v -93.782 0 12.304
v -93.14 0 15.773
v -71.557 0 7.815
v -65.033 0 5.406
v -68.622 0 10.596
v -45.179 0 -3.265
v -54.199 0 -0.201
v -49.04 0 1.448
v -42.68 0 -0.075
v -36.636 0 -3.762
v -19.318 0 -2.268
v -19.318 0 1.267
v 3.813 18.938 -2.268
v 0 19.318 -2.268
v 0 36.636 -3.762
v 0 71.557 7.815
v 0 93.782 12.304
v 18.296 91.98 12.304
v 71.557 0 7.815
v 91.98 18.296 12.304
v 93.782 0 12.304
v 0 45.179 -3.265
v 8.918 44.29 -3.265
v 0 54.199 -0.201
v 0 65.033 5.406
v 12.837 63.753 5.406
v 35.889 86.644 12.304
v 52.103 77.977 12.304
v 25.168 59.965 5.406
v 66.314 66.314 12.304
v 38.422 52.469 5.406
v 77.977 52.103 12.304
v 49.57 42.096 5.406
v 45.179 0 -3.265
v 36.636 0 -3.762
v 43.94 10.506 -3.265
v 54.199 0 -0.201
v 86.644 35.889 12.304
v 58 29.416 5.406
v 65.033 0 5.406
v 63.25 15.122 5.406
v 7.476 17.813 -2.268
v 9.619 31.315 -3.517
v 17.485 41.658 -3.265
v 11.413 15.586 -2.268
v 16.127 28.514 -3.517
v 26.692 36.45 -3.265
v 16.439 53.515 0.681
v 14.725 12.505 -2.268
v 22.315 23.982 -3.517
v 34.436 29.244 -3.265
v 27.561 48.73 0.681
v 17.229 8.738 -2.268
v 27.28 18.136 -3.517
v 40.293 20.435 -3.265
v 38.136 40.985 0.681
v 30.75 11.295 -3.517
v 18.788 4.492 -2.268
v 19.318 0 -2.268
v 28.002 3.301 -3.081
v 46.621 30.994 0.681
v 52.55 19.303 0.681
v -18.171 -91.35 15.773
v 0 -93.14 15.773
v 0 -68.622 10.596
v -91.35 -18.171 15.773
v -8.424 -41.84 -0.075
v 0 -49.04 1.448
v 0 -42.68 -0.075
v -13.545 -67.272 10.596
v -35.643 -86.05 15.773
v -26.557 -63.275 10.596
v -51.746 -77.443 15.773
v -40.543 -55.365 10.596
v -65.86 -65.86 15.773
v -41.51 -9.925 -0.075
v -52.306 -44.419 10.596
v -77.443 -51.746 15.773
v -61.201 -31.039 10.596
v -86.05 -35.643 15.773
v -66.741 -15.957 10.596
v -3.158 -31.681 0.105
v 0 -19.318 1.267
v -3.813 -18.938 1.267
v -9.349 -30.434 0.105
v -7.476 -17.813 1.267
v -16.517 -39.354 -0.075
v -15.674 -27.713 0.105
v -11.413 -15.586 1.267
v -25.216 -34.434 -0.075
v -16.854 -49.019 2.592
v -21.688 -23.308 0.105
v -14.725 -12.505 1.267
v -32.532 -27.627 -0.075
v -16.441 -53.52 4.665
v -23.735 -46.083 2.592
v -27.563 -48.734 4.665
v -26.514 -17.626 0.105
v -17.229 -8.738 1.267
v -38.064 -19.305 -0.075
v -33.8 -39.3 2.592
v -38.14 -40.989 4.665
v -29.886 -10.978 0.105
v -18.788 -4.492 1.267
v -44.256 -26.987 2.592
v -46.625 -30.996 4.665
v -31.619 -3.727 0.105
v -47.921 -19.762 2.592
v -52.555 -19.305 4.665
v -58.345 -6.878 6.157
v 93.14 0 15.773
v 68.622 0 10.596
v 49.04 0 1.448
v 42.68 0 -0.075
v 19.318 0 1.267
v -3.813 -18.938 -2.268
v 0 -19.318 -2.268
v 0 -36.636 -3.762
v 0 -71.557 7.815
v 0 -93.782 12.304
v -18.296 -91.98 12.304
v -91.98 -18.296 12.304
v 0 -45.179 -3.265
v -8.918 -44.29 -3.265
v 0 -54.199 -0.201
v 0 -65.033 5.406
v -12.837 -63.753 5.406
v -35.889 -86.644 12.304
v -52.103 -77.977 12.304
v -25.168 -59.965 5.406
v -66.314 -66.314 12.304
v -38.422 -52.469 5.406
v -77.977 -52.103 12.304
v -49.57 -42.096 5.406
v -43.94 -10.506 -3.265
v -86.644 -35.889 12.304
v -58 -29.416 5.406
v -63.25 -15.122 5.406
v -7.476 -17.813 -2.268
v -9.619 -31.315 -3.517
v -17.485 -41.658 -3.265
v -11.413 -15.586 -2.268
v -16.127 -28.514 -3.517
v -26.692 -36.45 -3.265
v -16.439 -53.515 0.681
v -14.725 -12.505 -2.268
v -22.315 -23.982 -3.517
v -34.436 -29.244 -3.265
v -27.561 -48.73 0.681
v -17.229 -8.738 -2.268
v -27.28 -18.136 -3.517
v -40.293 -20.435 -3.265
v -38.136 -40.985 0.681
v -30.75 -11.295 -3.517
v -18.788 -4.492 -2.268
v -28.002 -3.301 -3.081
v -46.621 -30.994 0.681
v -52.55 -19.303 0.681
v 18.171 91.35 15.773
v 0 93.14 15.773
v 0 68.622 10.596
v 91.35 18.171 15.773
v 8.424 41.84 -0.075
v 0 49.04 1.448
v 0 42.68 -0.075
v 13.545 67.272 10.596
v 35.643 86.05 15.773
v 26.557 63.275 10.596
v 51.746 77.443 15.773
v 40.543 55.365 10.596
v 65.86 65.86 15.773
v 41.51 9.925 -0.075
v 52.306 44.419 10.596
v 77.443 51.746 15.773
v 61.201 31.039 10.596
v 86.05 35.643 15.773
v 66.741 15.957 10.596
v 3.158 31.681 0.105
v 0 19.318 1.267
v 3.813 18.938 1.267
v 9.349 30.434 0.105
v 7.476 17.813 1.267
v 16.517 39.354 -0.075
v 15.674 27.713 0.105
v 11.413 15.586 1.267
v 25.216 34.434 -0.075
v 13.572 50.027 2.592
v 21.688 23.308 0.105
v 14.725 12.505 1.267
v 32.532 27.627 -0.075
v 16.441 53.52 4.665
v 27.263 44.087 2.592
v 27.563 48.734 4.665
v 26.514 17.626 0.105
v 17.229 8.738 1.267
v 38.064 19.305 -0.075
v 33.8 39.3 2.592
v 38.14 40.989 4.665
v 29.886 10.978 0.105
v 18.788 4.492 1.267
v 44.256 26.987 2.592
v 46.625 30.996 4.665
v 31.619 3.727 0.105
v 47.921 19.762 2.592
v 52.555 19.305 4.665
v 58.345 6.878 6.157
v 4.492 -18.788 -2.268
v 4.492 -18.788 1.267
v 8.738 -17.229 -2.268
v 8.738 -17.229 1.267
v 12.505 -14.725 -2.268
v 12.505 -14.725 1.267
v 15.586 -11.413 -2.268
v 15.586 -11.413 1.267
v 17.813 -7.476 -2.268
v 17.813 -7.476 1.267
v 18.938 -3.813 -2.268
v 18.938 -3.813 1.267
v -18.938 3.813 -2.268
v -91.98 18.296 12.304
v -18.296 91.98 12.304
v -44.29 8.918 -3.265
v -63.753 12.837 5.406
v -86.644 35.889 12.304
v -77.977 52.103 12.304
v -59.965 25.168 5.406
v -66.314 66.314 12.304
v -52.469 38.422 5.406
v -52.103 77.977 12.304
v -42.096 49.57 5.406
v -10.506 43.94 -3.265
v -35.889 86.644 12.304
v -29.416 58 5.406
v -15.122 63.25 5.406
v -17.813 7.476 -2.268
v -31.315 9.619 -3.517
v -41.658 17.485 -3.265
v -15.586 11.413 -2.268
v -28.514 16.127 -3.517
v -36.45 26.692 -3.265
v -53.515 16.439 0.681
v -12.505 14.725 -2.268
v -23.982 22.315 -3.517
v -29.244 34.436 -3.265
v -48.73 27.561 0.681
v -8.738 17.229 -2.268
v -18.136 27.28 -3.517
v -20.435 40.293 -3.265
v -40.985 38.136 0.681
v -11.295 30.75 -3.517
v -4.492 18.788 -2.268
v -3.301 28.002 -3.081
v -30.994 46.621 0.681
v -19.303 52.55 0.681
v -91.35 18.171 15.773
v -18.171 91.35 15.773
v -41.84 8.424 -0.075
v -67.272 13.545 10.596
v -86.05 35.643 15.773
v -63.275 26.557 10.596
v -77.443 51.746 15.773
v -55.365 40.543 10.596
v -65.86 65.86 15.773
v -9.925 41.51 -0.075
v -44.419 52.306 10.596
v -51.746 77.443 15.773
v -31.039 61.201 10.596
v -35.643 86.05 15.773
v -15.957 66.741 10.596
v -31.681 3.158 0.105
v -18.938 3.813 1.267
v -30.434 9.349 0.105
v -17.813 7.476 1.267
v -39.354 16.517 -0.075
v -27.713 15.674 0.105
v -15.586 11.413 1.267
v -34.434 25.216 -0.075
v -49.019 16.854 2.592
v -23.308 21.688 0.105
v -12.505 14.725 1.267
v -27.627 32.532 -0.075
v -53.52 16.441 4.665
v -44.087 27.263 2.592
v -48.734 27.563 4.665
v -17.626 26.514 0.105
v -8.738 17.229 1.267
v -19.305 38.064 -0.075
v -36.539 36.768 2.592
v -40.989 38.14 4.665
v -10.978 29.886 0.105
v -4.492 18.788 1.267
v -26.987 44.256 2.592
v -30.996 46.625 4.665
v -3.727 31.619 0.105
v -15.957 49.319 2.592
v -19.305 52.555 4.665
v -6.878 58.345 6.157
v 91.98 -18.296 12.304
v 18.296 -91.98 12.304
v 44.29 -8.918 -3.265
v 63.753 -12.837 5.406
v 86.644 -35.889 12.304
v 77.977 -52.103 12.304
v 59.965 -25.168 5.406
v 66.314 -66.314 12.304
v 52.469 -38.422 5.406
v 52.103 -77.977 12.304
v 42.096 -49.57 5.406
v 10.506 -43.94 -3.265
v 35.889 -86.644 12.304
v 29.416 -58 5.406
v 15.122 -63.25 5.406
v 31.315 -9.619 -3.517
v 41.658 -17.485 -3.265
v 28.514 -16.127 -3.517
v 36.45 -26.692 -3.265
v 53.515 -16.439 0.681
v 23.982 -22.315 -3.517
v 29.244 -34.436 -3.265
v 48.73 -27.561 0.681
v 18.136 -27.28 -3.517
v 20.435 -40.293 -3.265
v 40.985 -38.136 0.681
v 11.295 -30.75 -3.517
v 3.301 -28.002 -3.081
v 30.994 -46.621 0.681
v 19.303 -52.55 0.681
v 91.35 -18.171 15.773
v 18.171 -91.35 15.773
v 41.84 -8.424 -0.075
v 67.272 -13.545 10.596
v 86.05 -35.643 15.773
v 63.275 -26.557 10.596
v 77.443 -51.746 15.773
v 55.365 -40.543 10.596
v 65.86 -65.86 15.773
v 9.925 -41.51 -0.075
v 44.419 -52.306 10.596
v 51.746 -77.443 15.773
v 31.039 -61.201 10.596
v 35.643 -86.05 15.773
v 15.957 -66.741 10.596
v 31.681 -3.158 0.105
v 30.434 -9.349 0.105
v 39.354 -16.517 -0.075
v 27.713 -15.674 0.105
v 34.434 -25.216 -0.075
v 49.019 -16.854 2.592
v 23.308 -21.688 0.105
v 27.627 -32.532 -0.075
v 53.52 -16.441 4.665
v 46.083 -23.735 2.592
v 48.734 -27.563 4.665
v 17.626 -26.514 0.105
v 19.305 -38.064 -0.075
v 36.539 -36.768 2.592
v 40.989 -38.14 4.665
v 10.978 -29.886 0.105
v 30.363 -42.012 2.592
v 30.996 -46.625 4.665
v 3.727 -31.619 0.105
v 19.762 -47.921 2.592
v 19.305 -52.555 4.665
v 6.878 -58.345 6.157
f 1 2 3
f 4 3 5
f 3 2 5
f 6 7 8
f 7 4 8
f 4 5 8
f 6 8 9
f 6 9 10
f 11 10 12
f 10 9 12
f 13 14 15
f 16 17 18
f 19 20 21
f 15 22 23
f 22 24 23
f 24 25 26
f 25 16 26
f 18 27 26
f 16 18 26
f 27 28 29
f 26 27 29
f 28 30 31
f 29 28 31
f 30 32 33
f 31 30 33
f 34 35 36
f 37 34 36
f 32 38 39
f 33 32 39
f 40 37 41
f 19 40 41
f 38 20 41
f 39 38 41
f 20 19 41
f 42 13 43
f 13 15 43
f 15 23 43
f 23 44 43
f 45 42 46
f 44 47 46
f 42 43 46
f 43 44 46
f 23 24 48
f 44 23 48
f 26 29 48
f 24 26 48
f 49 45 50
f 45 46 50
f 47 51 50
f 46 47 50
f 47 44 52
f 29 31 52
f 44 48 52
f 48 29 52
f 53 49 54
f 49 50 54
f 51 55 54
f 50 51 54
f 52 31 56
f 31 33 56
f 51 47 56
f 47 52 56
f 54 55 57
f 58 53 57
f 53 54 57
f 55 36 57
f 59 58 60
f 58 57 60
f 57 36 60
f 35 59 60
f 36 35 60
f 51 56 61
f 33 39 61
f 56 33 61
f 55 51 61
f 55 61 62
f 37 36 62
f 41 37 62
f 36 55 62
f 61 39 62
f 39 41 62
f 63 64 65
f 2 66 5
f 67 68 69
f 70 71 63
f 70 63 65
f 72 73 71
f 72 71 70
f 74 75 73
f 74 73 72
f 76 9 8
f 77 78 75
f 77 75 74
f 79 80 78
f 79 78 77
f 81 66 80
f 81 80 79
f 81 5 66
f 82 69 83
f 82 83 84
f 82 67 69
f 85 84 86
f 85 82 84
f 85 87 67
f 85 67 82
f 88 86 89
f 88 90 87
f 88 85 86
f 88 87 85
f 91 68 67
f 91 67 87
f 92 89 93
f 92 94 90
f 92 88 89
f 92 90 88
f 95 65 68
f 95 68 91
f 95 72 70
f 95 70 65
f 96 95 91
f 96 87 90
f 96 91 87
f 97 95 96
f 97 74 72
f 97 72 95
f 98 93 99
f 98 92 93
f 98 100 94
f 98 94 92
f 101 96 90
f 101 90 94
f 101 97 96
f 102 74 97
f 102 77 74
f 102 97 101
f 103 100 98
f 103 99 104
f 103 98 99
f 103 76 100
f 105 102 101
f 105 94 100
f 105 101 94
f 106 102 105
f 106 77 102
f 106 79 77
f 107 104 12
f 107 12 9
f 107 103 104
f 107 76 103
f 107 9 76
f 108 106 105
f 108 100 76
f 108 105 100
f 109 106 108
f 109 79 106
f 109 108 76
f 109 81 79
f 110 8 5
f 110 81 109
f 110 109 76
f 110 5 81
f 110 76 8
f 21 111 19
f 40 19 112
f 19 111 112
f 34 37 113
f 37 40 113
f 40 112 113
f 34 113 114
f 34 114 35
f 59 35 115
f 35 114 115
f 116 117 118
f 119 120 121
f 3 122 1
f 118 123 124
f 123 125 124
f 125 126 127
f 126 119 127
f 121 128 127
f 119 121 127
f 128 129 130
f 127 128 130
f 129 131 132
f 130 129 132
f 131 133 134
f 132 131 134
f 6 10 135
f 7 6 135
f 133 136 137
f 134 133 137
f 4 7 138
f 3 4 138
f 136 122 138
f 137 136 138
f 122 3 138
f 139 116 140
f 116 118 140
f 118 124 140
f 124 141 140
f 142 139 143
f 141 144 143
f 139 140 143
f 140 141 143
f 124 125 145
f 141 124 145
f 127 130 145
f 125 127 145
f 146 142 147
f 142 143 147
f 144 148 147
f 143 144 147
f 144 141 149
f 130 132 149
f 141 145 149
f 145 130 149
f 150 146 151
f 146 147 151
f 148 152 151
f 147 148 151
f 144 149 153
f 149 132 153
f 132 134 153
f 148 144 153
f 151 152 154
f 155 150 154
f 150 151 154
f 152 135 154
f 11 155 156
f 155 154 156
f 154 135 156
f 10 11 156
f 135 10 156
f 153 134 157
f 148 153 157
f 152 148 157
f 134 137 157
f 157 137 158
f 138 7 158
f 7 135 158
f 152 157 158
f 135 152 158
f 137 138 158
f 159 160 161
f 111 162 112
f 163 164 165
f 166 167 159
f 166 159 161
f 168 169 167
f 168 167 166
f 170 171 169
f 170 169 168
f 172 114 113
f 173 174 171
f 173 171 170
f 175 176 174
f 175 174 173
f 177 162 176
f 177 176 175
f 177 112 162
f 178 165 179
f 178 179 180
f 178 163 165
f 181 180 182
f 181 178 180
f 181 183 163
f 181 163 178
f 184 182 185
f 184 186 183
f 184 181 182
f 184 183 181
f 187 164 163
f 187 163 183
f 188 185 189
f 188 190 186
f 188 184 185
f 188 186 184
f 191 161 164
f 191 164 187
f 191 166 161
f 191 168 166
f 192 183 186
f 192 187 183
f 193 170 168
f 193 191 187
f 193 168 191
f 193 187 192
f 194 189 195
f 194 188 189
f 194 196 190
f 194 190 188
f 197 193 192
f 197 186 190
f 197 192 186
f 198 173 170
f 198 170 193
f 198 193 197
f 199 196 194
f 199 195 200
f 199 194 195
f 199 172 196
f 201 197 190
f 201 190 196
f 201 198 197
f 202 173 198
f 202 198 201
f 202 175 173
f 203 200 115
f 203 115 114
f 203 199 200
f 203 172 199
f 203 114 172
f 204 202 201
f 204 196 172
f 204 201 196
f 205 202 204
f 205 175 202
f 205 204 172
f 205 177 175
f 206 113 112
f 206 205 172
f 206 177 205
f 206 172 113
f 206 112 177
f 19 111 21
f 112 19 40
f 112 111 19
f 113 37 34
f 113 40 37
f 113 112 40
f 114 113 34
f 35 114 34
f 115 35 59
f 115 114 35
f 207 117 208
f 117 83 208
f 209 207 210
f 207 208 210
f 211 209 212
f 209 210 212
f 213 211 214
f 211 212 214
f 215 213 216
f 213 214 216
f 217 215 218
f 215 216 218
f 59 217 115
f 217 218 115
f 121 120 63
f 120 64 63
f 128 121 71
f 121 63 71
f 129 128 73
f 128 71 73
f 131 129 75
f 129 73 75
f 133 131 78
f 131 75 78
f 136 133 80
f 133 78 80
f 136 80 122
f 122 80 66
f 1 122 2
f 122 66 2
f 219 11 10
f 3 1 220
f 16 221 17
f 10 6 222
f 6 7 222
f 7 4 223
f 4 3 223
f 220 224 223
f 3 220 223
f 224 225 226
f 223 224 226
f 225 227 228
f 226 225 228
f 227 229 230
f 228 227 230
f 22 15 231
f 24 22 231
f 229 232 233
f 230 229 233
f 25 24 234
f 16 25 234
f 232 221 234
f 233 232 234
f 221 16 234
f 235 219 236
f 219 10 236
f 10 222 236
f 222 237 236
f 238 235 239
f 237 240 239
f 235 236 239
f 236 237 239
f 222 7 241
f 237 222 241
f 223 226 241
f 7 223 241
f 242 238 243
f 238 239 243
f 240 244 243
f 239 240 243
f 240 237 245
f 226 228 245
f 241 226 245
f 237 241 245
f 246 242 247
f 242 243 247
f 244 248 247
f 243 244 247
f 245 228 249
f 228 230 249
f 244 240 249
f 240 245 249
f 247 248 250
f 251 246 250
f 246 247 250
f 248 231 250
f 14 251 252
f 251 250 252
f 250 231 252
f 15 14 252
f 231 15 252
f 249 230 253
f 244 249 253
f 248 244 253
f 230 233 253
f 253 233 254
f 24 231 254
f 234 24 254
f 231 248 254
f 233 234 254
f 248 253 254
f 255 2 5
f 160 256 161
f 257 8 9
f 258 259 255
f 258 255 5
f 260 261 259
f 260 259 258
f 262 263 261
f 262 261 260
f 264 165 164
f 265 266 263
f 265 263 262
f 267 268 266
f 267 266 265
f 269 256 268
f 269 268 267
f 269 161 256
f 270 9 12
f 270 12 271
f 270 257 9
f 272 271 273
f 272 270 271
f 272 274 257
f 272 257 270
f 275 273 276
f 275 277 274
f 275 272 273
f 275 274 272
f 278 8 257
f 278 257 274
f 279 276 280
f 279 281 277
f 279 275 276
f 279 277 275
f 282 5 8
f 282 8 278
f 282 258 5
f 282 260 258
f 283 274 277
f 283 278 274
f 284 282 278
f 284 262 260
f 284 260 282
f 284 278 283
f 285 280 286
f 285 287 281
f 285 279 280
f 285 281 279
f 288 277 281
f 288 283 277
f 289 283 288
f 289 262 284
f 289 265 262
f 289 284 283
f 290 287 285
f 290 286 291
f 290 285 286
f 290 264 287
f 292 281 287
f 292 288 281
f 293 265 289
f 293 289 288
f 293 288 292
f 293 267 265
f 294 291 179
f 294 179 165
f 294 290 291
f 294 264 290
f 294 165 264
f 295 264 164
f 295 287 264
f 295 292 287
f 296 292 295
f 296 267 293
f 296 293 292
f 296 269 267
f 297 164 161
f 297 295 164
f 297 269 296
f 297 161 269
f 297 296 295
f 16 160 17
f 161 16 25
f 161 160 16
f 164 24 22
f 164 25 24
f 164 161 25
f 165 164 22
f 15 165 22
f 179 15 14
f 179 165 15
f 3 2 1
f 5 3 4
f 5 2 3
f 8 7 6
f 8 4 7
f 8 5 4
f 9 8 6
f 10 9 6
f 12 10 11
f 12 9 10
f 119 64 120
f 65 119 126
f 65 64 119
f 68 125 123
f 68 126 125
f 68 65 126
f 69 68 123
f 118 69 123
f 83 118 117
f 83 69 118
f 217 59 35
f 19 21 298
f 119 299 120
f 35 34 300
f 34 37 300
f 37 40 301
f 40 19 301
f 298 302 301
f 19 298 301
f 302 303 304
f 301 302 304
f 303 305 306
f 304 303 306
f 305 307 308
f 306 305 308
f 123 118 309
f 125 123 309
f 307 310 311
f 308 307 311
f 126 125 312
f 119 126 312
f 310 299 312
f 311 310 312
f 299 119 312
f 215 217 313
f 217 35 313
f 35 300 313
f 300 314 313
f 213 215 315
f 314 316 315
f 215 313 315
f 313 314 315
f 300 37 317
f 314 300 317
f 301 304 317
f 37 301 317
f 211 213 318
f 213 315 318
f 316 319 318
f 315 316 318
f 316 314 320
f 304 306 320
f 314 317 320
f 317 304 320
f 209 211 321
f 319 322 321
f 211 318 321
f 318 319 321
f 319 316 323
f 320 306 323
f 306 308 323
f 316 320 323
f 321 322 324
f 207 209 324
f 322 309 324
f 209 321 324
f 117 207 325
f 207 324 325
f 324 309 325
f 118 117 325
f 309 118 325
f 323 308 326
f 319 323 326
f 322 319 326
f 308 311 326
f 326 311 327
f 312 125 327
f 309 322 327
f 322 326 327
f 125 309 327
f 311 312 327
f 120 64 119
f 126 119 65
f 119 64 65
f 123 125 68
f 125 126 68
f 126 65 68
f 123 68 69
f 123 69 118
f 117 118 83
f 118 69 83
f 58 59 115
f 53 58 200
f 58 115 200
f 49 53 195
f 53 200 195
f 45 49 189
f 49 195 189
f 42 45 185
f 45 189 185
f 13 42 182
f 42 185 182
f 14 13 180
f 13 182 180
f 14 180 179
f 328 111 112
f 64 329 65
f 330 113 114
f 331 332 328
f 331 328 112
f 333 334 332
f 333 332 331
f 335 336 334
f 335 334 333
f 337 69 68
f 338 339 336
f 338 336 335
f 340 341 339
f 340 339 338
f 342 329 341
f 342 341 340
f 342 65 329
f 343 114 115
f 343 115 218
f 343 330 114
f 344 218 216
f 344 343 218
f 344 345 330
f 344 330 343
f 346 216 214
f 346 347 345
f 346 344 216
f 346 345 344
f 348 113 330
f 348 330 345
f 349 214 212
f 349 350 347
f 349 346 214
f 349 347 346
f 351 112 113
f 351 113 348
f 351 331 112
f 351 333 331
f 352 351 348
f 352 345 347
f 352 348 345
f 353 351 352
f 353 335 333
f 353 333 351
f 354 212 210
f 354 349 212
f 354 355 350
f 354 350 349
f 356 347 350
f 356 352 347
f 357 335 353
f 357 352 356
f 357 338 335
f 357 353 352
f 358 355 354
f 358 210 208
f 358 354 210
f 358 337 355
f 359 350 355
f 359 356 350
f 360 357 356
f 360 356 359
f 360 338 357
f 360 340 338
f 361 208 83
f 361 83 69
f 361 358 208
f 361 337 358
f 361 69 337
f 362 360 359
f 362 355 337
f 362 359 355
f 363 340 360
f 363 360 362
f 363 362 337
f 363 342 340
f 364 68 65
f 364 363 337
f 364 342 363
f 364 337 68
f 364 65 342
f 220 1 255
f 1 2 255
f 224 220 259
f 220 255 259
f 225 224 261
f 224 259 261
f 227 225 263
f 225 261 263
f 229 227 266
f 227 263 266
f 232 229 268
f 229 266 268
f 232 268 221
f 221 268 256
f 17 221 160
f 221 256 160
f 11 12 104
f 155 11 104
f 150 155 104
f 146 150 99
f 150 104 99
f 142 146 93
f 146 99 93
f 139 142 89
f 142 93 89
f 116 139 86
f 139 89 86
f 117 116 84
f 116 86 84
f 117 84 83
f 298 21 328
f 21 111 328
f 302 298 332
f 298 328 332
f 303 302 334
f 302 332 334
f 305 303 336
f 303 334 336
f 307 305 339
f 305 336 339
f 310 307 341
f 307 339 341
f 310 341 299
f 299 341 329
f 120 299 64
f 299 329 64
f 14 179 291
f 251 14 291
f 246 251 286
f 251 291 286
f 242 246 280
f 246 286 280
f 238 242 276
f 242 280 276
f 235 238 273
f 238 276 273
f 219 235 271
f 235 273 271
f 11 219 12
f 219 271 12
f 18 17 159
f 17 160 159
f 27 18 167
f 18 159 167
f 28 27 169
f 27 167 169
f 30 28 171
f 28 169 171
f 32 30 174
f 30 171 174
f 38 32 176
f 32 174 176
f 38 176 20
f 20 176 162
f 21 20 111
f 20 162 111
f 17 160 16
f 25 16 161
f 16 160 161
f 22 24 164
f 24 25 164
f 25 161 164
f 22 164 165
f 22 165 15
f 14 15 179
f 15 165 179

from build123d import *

# Parameters (mm, degrees)
F1_ANGLE        = 90
F1_COPIES_COUNT = 4
F2_R            = 19.3178847041
F3_DEPTH        = 12.5


# Not quite as in the source:
# - a feature of the source that left no trace in its solid (it failed there, or was rolled back) is left out
# - the dataset's text gives a spline's control points without its knots; the knots are read off the source's solid
# - a pattern or mirror of a feature is missing from the dataset's text; its kind, count and spacing are read off the source's solid


with BuildPart() as f1:
    # F0 (on Front) → F1 (revolve)
    with BuildSketch(Plane.XZ):
        with BuildLine():
            add(Edge.make_bspline(
                [(0.535384993, 0.1223555221), (17.2094367636, 3.8394536298), (43.2929624479, -5.465311782), (64.2545376437, 11.4596925852), (81.7273993655, 13.6582770662), (93.1396260858, 15.7730262727)],
                knots=[0.004141275, 0.004141275, 0.004141275, 0.004141275, 0.3914803814, 0.6772663946, 1, 1, 1, 1], degree=3))
            Line((0.535384993, 0.1223555221), (0.474259215, -3.4347528534))
            Line((0.474259215, -3.4347528534), (0.8043280011, -3.4347528534))
            add(Edge.make_bspline(
                [(0.8043280011, -3.4347528534), (3.3148291149, -2.8468600912), (8.2742920499, -2.1143351467), (15.5332184992, -1.9868717443), (22.5825008916, -2.4781703416), (28.248732939, -3.0969025959), (32.6463450247, -3.5216344609), (35.8777622406, -3.7523528033), (39.0462368261, -3.838931027), (41.6353513211, -3.7390833353), (43.6825461889, -3.5194285423), (45.6918972373, -3.1953102754), (48.0788038091, -2.6179690834), (50.7700150604, -1.7083774784), (53.3020669479, -0.643306801), (55.7005846476, 0.5201483357), (57.9922146811, 1.7293684368), (60.2039145986, 2.9362082665), (62.3608906754, 4.0964681393), (64.1325757078, 4.9908391226), (65.5452849821, 5.6448511365), (66.9605812541, 6.2523714935), (68.7937846142, 6.9489329742), (71.0931629092, 7.695431129), (73.5021272144, 8.3680692714), (76.8661994201, 9.1856648058), (81.3678679034, 10.0966139075), (87.2697497294, 11.1392380289), (91.5514001783, 11.890991348), (93.7823810236, 12.3044045309)],
                knots=[0, 0, 0, 0, 0.0625, 0.125, 0.1875, 0.25, 0.28125, 0.3125, 0.34375, 0.375, 0.390625, 0.40625, 0.4375, 0.46875, 0.5, 0.53125, 0.5625, 0.59375, 0.625, 0.65625, 0.671875, 0.6875, 0.71875, 0.75, 0.78125, 0.8125, 0.875, 0.9375, 1, 1, 1, 1], degree=3))
            Line((93.7823810236, 12.3044045309), (93.1396260858, 15.7730262727))
        make_face()
    revolve(axis=Axis((0, 0, -1.7173764267), (0, 0, -1)), revolution_arc=F1_ANGLE)


with BuildPart() as f1_copies_1:
    # F1_copies: instance of F1
    add(f1.part.rotate(Axis((0, 0, 0), (0, 0, 1)), 1 * 360 / F1_COPIES_COUNT))


with BuildPart() as f1_copies_2:
    # F1_copies: instance of F1
    add(f1.part.rotate(Axis((0, 0, 0), (0, 0, 1)), 2 * 360 / F1_COPIES_COUNT))


with BuildPart() as f1_copies_3:
    # F1_copies: instance of F1
    add(f1.part.rotate(Axis((0, 0, 0), (0, 0, 1)), 3 * 360 / F1_COPIES_COUNT))


with BuildPart() as f3_tool:
    # F2 (on Top) → F3 (new body, symmetric)
    with BuildSketch(Plane.XY):
        Circle(F2_R)
    extrude(amount=F3_DEPTH, both=True)


with BuildPart() as f1_1:
    add(f1.part)

    # F3: cut by f3_tool
    add(f3_tool.part, mode=Mode.SUBTRACT)


with BuildPart() as f1_copies_1_1:
    add(f1_copies_1.part)

    # F3: cut by f3_tool
    add(f3_tool.part, mode=Mode.SUBTRACT)


with BuildPart() as f1_copies_2_1:
    add(f1_copies_2.part)

    # F3: cut by f3_tool
    add(f3_tool.part, mode=Mode.SUBTRACT)


with BuildPart() as f1_copies_3_1:
    add(f1_copies_3.part)

    # F3: cut by f3_tool
    add(f3_tool.part, mode=Mode.SUBTRACT)


solid = Compound([f1_1.part, f1_copies_1_1.part, f1_copies_2_1.part, f1_copies_3_1.part])
